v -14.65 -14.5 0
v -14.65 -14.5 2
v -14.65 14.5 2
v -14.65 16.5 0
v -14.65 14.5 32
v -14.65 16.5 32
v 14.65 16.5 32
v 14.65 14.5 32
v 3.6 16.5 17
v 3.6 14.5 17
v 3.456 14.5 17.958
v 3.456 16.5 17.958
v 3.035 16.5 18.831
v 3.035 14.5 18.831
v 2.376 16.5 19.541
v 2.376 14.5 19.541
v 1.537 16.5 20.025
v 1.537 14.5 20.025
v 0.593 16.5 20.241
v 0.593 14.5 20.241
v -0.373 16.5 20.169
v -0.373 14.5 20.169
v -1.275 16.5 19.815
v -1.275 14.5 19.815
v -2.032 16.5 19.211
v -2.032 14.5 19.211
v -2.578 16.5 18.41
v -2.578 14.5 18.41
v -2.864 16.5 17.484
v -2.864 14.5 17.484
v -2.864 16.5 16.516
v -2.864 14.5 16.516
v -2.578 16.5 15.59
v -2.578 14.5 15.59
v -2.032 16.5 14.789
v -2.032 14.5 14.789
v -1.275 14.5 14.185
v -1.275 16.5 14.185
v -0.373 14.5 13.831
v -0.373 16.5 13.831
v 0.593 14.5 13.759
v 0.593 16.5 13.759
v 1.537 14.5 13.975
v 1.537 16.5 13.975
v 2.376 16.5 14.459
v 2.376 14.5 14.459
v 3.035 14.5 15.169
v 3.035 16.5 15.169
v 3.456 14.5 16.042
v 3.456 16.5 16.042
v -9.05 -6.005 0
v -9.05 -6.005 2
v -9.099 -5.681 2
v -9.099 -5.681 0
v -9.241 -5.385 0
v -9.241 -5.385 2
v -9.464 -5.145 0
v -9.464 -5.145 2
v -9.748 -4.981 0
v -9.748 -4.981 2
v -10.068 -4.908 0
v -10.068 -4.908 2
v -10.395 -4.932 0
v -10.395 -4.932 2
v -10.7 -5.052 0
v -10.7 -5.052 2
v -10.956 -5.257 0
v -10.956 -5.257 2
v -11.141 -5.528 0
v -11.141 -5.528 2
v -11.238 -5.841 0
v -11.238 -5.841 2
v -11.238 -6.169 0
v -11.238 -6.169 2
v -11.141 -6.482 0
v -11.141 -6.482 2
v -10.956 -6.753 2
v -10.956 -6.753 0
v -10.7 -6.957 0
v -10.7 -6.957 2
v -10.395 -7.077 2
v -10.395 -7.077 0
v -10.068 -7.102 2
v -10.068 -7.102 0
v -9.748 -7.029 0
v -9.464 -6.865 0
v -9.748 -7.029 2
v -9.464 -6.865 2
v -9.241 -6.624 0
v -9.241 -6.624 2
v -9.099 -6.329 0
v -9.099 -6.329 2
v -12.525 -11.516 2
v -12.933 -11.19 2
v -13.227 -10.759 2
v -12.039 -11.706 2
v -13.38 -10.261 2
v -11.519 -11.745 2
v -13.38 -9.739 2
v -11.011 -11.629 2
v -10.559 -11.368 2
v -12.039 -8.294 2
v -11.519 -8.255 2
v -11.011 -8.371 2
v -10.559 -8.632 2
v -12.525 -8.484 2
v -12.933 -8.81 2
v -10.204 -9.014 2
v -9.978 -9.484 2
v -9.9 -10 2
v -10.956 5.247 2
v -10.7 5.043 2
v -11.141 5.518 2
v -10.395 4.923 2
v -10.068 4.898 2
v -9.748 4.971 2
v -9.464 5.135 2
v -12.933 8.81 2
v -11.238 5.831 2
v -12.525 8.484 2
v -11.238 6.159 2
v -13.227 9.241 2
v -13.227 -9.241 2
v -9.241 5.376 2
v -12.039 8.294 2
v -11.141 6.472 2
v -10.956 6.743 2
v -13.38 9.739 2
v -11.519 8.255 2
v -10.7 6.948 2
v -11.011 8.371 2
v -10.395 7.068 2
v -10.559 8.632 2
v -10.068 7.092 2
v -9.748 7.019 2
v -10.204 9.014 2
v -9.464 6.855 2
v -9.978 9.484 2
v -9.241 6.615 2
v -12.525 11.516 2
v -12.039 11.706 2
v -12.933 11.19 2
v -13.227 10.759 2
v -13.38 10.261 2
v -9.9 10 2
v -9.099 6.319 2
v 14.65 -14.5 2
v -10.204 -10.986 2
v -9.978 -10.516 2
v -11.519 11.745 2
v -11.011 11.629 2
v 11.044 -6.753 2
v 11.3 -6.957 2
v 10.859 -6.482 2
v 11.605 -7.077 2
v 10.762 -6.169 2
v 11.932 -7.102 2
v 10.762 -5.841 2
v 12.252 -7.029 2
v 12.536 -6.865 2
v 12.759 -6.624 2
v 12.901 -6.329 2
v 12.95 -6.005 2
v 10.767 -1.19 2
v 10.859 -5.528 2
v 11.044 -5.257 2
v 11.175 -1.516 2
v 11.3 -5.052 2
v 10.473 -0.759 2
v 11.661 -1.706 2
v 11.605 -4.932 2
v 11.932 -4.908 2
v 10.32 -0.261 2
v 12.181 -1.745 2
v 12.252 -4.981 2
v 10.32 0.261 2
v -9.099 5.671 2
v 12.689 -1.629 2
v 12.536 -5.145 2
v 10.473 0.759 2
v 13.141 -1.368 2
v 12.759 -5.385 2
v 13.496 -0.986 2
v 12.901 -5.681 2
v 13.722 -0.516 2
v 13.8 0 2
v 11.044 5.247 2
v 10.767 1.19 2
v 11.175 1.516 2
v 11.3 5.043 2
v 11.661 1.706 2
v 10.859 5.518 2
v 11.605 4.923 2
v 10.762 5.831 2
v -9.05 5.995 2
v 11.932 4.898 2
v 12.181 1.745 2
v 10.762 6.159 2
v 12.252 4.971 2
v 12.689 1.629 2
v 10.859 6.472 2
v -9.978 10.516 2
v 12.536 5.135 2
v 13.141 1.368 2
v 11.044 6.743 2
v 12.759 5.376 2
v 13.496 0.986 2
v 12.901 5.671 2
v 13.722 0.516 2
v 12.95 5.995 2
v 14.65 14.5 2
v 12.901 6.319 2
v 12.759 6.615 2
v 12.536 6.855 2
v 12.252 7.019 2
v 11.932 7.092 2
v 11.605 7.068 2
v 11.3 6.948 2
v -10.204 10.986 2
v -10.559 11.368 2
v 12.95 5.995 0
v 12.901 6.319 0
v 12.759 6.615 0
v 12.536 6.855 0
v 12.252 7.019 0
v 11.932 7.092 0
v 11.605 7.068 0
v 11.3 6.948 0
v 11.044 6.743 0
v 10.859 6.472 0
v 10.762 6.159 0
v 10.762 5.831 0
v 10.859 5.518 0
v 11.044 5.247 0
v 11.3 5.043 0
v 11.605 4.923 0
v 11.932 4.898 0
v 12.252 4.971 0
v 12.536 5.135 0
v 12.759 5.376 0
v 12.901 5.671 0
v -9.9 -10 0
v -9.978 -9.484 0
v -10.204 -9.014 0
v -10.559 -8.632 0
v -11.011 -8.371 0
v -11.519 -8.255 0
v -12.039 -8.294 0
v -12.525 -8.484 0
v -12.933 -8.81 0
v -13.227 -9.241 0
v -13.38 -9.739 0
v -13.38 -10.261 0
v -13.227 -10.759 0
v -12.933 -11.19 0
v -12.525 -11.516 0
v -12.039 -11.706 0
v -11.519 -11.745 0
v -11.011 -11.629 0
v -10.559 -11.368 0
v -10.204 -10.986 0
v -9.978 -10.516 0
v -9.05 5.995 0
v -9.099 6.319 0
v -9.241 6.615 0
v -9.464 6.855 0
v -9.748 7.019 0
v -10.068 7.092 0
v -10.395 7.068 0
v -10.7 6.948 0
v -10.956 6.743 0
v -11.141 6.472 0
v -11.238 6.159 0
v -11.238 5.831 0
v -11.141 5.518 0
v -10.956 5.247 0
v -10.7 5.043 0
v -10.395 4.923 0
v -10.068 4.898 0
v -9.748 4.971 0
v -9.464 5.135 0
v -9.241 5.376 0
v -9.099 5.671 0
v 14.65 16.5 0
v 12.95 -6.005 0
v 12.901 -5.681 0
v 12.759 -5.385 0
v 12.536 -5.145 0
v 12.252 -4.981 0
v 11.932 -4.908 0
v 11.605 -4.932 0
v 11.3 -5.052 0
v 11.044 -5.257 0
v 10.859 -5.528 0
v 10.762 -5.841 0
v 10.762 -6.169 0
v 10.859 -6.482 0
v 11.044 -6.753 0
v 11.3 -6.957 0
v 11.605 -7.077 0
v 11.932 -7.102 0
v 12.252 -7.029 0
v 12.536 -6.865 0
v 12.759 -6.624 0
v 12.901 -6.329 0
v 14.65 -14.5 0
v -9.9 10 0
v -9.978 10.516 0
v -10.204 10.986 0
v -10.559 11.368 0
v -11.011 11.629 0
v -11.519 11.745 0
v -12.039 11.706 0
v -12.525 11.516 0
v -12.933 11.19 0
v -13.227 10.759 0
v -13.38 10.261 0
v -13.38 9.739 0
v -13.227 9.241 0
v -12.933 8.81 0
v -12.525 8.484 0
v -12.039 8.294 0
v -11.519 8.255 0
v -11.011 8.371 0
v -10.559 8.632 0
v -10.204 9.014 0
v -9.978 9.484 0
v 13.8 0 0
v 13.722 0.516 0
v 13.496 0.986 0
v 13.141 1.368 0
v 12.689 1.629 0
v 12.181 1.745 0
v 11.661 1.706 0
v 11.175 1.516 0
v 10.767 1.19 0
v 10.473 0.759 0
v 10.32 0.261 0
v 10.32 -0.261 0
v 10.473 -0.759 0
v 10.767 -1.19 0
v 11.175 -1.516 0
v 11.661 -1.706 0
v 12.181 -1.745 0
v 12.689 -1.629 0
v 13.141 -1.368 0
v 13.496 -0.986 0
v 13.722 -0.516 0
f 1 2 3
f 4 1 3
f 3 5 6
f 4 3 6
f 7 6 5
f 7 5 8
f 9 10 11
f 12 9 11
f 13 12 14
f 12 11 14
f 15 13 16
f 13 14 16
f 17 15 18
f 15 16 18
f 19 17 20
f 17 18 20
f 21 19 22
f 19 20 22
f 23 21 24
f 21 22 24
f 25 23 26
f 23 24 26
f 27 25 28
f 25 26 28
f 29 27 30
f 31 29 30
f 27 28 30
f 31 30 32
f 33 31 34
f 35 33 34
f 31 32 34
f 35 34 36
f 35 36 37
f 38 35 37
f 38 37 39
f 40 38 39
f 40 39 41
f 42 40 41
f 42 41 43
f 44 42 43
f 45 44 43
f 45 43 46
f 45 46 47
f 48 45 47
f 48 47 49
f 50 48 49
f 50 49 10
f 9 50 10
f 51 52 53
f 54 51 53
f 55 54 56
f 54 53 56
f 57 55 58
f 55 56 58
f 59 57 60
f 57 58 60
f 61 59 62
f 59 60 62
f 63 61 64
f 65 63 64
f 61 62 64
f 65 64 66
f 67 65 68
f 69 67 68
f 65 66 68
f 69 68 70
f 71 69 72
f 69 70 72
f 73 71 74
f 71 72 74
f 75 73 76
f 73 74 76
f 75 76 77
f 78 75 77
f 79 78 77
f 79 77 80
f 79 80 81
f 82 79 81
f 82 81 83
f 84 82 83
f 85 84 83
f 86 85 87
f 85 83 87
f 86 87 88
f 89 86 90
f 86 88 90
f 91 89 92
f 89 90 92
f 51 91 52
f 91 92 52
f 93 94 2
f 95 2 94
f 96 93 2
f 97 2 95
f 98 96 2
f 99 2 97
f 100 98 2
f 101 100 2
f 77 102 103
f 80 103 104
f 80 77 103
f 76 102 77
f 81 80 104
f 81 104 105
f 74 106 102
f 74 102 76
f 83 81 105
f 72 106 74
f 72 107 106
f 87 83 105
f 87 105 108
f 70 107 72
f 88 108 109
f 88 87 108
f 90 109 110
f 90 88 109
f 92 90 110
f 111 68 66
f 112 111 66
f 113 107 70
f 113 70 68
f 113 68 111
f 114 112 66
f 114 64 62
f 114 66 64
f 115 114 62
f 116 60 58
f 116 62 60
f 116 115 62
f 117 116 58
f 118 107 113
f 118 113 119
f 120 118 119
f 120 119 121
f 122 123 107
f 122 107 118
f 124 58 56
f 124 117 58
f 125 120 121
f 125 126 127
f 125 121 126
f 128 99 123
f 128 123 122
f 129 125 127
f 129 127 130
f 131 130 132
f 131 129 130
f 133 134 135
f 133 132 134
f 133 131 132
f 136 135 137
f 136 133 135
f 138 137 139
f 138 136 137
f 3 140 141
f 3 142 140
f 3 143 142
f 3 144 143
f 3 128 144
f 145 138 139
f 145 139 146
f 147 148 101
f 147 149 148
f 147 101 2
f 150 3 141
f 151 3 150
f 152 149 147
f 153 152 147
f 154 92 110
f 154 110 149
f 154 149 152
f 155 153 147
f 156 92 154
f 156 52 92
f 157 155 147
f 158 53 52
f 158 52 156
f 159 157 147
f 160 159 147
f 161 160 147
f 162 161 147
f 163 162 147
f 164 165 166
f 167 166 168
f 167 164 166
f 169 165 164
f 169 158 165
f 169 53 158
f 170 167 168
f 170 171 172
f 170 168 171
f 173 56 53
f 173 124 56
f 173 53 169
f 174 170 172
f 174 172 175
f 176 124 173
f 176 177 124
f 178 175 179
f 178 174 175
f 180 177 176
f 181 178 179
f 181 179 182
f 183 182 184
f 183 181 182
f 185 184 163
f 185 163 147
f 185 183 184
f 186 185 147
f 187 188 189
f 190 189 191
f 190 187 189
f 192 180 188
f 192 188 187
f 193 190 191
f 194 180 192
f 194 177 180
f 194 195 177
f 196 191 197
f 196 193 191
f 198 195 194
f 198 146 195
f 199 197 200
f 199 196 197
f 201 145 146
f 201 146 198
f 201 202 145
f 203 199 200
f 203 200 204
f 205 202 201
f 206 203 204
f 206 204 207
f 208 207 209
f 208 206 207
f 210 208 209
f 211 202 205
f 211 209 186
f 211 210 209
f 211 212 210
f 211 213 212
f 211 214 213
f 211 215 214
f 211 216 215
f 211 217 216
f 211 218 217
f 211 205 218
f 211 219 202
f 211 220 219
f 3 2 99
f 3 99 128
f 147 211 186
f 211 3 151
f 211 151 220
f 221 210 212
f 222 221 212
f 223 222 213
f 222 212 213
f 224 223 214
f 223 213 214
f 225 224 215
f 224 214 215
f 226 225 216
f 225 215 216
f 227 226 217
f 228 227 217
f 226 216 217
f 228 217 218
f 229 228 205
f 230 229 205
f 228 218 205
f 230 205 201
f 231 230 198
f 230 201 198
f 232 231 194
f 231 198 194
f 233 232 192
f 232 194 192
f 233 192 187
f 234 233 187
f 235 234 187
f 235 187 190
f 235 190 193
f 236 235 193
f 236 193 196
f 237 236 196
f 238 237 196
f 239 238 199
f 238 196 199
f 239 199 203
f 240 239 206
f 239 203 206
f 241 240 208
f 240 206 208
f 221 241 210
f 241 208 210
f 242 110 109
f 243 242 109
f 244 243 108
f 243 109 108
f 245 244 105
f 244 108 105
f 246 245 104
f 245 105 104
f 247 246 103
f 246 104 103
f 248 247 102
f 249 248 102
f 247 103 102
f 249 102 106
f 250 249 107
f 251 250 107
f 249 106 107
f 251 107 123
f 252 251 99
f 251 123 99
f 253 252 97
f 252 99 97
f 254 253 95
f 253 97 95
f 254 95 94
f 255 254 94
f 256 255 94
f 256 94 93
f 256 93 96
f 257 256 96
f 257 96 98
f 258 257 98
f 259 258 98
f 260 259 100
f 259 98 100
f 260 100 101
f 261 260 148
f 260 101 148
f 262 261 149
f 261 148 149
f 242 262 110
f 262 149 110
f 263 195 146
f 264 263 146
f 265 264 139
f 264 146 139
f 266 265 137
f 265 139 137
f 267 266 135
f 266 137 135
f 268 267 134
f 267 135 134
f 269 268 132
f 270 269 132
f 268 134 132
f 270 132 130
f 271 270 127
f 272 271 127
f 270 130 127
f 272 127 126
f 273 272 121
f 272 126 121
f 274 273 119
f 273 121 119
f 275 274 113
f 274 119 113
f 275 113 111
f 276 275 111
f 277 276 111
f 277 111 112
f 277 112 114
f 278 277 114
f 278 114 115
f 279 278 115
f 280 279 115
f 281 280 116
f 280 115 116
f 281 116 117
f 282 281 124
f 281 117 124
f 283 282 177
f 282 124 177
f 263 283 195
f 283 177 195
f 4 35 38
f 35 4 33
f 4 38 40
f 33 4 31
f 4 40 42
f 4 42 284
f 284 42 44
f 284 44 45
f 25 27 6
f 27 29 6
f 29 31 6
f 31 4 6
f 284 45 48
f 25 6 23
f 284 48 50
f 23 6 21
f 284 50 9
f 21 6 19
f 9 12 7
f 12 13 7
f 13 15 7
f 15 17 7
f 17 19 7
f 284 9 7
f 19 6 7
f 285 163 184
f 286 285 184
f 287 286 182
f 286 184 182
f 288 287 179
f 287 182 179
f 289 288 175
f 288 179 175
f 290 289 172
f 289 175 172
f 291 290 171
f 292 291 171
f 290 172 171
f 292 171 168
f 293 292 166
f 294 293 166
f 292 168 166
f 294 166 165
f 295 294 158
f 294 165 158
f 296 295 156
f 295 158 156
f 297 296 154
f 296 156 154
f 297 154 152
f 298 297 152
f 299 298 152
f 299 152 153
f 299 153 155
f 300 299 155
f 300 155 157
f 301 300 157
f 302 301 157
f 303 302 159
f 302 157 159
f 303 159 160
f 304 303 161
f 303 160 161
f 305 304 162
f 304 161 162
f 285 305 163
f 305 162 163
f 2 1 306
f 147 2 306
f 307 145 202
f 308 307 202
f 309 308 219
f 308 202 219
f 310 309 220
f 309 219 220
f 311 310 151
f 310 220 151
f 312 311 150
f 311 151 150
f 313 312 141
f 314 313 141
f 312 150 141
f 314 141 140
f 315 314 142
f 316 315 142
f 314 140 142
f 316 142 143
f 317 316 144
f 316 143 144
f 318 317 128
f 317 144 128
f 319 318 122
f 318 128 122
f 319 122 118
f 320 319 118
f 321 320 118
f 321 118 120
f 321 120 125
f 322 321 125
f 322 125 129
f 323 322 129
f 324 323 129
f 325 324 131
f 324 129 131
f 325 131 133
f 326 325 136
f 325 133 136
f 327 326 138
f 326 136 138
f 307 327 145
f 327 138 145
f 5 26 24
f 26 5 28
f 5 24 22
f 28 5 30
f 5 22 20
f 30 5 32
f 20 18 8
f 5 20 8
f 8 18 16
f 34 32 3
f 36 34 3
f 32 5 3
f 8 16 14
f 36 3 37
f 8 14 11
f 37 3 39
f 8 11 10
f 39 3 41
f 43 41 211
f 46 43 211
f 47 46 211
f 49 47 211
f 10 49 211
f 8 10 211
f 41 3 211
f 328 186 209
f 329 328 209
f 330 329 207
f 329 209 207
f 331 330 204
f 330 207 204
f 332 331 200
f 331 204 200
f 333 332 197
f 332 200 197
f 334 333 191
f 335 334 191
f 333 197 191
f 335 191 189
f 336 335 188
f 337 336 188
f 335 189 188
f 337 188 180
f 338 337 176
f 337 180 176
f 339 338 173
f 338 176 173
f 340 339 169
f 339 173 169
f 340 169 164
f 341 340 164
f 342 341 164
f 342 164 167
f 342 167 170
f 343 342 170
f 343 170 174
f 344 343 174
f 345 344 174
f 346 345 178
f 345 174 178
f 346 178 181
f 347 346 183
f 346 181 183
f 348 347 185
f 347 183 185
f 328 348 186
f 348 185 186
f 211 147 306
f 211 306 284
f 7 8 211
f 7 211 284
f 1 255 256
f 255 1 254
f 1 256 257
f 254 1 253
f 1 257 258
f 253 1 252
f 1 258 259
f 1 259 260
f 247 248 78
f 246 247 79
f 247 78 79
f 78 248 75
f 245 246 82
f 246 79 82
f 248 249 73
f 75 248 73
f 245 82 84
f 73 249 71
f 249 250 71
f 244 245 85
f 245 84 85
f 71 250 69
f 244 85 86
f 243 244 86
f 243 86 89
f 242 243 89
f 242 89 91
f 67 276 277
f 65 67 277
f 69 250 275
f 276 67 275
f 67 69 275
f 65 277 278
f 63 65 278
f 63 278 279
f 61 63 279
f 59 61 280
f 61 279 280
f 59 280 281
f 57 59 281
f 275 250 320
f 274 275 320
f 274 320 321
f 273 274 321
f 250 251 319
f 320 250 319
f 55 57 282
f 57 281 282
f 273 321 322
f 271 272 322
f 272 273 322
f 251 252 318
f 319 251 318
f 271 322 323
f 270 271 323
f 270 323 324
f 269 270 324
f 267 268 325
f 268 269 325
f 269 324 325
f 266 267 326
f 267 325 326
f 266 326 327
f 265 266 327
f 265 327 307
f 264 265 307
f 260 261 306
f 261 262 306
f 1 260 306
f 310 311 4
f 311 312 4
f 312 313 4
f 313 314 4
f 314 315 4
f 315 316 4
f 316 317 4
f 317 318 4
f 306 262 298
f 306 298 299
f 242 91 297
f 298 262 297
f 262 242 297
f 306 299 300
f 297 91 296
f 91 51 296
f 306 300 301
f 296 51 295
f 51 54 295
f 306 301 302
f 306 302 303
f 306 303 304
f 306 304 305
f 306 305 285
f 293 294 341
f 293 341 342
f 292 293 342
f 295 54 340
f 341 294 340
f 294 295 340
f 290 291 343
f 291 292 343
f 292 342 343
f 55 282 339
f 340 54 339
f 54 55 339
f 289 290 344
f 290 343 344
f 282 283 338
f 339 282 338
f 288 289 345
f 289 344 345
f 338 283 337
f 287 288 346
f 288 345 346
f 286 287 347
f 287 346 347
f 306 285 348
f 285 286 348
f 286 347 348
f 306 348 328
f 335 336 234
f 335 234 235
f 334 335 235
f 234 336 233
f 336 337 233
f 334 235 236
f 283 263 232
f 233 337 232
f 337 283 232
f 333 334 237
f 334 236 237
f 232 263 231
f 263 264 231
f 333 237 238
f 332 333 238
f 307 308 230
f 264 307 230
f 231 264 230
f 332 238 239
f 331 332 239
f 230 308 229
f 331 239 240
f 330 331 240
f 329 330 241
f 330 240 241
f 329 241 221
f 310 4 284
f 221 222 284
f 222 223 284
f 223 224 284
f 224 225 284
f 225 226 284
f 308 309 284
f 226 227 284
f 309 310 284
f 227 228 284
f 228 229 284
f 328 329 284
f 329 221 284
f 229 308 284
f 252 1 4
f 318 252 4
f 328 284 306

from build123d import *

# Parameters (mm, degrees)
SKETCH_1_W           = 29.3
SKETCH_1_H           = 29
EXTRUDE_1_DEPTH      = 2
SKETCH_2_R           = 1.75
CUT_EXTRUDE_1_DEPTH  = 2
SKETCH_3_R           = 1.1
CUT_EXTRUDE_2_DEPTH  = 2
SKETCH_4_W           = 29.3
SKETCH_4_H           = 2
EXTRUDE_2_DEPTH      = 30
EXTRUDE_2_DEPTH_BACK = 2
SKETCH_5_R           = 3.25
CUT_EXTRUDE_3_DEPTH  = 30


with BuildPart() as part:
    # 草图1 → 凸台-拉伸1 (new body)
    with BuildSketch(Plane.XY):
        Rectangle(SKETCH_1_W, SKETCH_1_H)
    extrude(amount=EXTRUDE_1_DEPTH)

    # 草图2 → 切除-拉伸1 (cut)
    with BuildSketch(Plane.XY.offset(2)):
        with Locations((-11.65, 10)):
            Circle(SKETCH_2_R)
        with Locations((-11.65, -10)):
            Circle(SKETCH_2_R)
        with Locations((12.05, 0)):
            Circle(SKETCH_2_R)
    extrude(amount=-CUT_EXTRUDE_1_DEPTH, mode=Mode.SUBTRACT)

    # 草图3 → 切除-拉伸2 (cut)
    with BuildSketch(Plane.XY.offset(2)):
        with Locations((-10.15, 5.995187484)):
            Circle(SKETCH_3_R)
        with Locations((-10.15, -6.004812516)):
            Circle(SKETCH_3_R)
        with Locations((11.85, 5.995187484)):
            Circle(SKETCH_3_R)
        with Locations((11.85, -6.004812516)):
            Circle(SKETCH_3_R)
    extrude(amount=-CUT_EXTRUDE_2_DEPTH, mode=Mode.SUBTRACT)

    # 草图4 → 凸台-拉伸2 (add, two sides)
    with BuildSketch(Plane.XY.offset(2)) as extrude_2_sk:
        with Locations((0, 15.5)):
            Rectangle(SKETCH_4_W, SKETCH_4_H)
    extrude(amount=EXTRUDE_2_DEPTH)
    extrude(extrude_2_sk.sketch, amount=-EXTRUDE_2_DEPTH_BACK)

    # 草图5 → 切除-拉伸3 (cut)
    with BuildSketch(Plane.XZ.offset(-14.5)):
        with Locations((0.35, 17)):
            Circle(SKETCH_5_R)
    extrude(amount=-CUT_EXTRUDE_3_DEPTH, mode=Mode.SUBTRACT)


solid = part.part
